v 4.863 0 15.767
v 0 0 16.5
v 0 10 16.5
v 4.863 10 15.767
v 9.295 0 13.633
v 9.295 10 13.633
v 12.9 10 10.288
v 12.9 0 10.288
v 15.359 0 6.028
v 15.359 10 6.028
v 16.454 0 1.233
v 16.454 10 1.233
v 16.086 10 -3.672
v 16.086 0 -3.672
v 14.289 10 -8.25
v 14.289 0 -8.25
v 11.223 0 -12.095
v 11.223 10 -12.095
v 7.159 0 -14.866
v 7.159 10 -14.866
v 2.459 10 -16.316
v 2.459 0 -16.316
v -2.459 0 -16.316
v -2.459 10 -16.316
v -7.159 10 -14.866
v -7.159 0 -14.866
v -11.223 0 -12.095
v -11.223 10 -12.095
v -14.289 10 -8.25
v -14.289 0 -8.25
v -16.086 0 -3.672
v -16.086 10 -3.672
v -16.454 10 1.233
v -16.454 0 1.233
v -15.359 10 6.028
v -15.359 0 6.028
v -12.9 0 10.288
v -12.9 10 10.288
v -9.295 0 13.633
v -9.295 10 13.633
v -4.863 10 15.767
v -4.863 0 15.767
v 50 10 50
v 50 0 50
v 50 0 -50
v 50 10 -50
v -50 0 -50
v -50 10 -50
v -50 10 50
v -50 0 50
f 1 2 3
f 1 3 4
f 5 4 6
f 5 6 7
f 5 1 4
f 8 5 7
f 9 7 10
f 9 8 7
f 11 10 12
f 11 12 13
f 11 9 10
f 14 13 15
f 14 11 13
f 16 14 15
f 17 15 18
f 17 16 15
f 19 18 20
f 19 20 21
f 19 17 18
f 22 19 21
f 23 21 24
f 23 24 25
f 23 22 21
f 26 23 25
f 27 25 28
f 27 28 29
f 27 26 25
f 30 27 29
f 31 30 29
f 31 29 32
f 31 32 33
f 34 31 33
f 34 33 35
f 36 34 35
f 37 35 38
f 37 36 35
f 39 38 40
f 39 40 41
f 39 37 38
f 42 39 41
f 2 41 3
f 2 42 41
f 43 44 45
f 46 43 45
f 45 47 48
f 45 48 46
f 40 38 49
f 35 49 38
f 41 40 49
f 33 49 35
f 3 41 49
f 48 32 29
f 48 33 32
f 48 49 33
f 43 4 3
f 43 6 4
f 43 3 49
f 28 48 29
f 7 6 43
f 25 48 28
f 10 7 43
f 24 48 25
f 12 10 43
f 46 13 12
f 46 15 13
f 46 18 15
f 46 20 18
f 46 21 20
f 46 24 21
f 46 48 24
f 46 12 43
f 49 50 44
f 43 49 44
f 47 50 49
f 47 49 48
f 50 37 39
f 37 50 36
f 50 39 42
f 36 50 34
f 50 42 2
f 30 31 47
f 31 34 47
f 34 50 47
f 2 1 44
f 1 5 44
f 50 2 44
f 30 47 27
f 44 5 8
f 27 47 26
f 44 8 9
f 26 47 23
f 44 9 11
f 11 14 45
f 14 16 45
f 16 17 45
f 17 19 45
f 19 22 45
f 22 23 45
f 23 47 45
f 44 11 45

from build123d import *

# Parameters (mm, degrees)
SKETCH1_W           = 100
SKETCH1_H           = 100
SKETCH1_R           = 19
SKETCH1_R_2         = 16.5
BOSS_EXTRUDE1_DEPTH = 10


with BuildPart() as part:
    # Sketch1 → Boss-Extrude1 (new body)
    # profile 1 of 2: a face of its own
    with BuildSketch(Plane(origin=(0, 0, 0), x_dir=(1, 0, 0), z_dir=(0, 1, 0))):
        Rectangle(SKETCH1_W, SKETCH1_H)
        Circle(SKETCH1_R, mode=Mode.SUBTRACT)
    # profile 2 of 2: a face of its own
    with BuildSketch(Plane(origin=(0, 0, 0), x_dir=(1, 0, 0), z_dir=(0, 1, 0))):
        Circle(SKETCH1_R)
        with Locations(Location((0, 0, 0), (0, 0, 270))):
            Circle(SKETCH1_R_2, mode=Mode.SUBTRACT)
    extrude(amount=BOSS_EXTRUDE1_DEPTH)


solid = part.part
